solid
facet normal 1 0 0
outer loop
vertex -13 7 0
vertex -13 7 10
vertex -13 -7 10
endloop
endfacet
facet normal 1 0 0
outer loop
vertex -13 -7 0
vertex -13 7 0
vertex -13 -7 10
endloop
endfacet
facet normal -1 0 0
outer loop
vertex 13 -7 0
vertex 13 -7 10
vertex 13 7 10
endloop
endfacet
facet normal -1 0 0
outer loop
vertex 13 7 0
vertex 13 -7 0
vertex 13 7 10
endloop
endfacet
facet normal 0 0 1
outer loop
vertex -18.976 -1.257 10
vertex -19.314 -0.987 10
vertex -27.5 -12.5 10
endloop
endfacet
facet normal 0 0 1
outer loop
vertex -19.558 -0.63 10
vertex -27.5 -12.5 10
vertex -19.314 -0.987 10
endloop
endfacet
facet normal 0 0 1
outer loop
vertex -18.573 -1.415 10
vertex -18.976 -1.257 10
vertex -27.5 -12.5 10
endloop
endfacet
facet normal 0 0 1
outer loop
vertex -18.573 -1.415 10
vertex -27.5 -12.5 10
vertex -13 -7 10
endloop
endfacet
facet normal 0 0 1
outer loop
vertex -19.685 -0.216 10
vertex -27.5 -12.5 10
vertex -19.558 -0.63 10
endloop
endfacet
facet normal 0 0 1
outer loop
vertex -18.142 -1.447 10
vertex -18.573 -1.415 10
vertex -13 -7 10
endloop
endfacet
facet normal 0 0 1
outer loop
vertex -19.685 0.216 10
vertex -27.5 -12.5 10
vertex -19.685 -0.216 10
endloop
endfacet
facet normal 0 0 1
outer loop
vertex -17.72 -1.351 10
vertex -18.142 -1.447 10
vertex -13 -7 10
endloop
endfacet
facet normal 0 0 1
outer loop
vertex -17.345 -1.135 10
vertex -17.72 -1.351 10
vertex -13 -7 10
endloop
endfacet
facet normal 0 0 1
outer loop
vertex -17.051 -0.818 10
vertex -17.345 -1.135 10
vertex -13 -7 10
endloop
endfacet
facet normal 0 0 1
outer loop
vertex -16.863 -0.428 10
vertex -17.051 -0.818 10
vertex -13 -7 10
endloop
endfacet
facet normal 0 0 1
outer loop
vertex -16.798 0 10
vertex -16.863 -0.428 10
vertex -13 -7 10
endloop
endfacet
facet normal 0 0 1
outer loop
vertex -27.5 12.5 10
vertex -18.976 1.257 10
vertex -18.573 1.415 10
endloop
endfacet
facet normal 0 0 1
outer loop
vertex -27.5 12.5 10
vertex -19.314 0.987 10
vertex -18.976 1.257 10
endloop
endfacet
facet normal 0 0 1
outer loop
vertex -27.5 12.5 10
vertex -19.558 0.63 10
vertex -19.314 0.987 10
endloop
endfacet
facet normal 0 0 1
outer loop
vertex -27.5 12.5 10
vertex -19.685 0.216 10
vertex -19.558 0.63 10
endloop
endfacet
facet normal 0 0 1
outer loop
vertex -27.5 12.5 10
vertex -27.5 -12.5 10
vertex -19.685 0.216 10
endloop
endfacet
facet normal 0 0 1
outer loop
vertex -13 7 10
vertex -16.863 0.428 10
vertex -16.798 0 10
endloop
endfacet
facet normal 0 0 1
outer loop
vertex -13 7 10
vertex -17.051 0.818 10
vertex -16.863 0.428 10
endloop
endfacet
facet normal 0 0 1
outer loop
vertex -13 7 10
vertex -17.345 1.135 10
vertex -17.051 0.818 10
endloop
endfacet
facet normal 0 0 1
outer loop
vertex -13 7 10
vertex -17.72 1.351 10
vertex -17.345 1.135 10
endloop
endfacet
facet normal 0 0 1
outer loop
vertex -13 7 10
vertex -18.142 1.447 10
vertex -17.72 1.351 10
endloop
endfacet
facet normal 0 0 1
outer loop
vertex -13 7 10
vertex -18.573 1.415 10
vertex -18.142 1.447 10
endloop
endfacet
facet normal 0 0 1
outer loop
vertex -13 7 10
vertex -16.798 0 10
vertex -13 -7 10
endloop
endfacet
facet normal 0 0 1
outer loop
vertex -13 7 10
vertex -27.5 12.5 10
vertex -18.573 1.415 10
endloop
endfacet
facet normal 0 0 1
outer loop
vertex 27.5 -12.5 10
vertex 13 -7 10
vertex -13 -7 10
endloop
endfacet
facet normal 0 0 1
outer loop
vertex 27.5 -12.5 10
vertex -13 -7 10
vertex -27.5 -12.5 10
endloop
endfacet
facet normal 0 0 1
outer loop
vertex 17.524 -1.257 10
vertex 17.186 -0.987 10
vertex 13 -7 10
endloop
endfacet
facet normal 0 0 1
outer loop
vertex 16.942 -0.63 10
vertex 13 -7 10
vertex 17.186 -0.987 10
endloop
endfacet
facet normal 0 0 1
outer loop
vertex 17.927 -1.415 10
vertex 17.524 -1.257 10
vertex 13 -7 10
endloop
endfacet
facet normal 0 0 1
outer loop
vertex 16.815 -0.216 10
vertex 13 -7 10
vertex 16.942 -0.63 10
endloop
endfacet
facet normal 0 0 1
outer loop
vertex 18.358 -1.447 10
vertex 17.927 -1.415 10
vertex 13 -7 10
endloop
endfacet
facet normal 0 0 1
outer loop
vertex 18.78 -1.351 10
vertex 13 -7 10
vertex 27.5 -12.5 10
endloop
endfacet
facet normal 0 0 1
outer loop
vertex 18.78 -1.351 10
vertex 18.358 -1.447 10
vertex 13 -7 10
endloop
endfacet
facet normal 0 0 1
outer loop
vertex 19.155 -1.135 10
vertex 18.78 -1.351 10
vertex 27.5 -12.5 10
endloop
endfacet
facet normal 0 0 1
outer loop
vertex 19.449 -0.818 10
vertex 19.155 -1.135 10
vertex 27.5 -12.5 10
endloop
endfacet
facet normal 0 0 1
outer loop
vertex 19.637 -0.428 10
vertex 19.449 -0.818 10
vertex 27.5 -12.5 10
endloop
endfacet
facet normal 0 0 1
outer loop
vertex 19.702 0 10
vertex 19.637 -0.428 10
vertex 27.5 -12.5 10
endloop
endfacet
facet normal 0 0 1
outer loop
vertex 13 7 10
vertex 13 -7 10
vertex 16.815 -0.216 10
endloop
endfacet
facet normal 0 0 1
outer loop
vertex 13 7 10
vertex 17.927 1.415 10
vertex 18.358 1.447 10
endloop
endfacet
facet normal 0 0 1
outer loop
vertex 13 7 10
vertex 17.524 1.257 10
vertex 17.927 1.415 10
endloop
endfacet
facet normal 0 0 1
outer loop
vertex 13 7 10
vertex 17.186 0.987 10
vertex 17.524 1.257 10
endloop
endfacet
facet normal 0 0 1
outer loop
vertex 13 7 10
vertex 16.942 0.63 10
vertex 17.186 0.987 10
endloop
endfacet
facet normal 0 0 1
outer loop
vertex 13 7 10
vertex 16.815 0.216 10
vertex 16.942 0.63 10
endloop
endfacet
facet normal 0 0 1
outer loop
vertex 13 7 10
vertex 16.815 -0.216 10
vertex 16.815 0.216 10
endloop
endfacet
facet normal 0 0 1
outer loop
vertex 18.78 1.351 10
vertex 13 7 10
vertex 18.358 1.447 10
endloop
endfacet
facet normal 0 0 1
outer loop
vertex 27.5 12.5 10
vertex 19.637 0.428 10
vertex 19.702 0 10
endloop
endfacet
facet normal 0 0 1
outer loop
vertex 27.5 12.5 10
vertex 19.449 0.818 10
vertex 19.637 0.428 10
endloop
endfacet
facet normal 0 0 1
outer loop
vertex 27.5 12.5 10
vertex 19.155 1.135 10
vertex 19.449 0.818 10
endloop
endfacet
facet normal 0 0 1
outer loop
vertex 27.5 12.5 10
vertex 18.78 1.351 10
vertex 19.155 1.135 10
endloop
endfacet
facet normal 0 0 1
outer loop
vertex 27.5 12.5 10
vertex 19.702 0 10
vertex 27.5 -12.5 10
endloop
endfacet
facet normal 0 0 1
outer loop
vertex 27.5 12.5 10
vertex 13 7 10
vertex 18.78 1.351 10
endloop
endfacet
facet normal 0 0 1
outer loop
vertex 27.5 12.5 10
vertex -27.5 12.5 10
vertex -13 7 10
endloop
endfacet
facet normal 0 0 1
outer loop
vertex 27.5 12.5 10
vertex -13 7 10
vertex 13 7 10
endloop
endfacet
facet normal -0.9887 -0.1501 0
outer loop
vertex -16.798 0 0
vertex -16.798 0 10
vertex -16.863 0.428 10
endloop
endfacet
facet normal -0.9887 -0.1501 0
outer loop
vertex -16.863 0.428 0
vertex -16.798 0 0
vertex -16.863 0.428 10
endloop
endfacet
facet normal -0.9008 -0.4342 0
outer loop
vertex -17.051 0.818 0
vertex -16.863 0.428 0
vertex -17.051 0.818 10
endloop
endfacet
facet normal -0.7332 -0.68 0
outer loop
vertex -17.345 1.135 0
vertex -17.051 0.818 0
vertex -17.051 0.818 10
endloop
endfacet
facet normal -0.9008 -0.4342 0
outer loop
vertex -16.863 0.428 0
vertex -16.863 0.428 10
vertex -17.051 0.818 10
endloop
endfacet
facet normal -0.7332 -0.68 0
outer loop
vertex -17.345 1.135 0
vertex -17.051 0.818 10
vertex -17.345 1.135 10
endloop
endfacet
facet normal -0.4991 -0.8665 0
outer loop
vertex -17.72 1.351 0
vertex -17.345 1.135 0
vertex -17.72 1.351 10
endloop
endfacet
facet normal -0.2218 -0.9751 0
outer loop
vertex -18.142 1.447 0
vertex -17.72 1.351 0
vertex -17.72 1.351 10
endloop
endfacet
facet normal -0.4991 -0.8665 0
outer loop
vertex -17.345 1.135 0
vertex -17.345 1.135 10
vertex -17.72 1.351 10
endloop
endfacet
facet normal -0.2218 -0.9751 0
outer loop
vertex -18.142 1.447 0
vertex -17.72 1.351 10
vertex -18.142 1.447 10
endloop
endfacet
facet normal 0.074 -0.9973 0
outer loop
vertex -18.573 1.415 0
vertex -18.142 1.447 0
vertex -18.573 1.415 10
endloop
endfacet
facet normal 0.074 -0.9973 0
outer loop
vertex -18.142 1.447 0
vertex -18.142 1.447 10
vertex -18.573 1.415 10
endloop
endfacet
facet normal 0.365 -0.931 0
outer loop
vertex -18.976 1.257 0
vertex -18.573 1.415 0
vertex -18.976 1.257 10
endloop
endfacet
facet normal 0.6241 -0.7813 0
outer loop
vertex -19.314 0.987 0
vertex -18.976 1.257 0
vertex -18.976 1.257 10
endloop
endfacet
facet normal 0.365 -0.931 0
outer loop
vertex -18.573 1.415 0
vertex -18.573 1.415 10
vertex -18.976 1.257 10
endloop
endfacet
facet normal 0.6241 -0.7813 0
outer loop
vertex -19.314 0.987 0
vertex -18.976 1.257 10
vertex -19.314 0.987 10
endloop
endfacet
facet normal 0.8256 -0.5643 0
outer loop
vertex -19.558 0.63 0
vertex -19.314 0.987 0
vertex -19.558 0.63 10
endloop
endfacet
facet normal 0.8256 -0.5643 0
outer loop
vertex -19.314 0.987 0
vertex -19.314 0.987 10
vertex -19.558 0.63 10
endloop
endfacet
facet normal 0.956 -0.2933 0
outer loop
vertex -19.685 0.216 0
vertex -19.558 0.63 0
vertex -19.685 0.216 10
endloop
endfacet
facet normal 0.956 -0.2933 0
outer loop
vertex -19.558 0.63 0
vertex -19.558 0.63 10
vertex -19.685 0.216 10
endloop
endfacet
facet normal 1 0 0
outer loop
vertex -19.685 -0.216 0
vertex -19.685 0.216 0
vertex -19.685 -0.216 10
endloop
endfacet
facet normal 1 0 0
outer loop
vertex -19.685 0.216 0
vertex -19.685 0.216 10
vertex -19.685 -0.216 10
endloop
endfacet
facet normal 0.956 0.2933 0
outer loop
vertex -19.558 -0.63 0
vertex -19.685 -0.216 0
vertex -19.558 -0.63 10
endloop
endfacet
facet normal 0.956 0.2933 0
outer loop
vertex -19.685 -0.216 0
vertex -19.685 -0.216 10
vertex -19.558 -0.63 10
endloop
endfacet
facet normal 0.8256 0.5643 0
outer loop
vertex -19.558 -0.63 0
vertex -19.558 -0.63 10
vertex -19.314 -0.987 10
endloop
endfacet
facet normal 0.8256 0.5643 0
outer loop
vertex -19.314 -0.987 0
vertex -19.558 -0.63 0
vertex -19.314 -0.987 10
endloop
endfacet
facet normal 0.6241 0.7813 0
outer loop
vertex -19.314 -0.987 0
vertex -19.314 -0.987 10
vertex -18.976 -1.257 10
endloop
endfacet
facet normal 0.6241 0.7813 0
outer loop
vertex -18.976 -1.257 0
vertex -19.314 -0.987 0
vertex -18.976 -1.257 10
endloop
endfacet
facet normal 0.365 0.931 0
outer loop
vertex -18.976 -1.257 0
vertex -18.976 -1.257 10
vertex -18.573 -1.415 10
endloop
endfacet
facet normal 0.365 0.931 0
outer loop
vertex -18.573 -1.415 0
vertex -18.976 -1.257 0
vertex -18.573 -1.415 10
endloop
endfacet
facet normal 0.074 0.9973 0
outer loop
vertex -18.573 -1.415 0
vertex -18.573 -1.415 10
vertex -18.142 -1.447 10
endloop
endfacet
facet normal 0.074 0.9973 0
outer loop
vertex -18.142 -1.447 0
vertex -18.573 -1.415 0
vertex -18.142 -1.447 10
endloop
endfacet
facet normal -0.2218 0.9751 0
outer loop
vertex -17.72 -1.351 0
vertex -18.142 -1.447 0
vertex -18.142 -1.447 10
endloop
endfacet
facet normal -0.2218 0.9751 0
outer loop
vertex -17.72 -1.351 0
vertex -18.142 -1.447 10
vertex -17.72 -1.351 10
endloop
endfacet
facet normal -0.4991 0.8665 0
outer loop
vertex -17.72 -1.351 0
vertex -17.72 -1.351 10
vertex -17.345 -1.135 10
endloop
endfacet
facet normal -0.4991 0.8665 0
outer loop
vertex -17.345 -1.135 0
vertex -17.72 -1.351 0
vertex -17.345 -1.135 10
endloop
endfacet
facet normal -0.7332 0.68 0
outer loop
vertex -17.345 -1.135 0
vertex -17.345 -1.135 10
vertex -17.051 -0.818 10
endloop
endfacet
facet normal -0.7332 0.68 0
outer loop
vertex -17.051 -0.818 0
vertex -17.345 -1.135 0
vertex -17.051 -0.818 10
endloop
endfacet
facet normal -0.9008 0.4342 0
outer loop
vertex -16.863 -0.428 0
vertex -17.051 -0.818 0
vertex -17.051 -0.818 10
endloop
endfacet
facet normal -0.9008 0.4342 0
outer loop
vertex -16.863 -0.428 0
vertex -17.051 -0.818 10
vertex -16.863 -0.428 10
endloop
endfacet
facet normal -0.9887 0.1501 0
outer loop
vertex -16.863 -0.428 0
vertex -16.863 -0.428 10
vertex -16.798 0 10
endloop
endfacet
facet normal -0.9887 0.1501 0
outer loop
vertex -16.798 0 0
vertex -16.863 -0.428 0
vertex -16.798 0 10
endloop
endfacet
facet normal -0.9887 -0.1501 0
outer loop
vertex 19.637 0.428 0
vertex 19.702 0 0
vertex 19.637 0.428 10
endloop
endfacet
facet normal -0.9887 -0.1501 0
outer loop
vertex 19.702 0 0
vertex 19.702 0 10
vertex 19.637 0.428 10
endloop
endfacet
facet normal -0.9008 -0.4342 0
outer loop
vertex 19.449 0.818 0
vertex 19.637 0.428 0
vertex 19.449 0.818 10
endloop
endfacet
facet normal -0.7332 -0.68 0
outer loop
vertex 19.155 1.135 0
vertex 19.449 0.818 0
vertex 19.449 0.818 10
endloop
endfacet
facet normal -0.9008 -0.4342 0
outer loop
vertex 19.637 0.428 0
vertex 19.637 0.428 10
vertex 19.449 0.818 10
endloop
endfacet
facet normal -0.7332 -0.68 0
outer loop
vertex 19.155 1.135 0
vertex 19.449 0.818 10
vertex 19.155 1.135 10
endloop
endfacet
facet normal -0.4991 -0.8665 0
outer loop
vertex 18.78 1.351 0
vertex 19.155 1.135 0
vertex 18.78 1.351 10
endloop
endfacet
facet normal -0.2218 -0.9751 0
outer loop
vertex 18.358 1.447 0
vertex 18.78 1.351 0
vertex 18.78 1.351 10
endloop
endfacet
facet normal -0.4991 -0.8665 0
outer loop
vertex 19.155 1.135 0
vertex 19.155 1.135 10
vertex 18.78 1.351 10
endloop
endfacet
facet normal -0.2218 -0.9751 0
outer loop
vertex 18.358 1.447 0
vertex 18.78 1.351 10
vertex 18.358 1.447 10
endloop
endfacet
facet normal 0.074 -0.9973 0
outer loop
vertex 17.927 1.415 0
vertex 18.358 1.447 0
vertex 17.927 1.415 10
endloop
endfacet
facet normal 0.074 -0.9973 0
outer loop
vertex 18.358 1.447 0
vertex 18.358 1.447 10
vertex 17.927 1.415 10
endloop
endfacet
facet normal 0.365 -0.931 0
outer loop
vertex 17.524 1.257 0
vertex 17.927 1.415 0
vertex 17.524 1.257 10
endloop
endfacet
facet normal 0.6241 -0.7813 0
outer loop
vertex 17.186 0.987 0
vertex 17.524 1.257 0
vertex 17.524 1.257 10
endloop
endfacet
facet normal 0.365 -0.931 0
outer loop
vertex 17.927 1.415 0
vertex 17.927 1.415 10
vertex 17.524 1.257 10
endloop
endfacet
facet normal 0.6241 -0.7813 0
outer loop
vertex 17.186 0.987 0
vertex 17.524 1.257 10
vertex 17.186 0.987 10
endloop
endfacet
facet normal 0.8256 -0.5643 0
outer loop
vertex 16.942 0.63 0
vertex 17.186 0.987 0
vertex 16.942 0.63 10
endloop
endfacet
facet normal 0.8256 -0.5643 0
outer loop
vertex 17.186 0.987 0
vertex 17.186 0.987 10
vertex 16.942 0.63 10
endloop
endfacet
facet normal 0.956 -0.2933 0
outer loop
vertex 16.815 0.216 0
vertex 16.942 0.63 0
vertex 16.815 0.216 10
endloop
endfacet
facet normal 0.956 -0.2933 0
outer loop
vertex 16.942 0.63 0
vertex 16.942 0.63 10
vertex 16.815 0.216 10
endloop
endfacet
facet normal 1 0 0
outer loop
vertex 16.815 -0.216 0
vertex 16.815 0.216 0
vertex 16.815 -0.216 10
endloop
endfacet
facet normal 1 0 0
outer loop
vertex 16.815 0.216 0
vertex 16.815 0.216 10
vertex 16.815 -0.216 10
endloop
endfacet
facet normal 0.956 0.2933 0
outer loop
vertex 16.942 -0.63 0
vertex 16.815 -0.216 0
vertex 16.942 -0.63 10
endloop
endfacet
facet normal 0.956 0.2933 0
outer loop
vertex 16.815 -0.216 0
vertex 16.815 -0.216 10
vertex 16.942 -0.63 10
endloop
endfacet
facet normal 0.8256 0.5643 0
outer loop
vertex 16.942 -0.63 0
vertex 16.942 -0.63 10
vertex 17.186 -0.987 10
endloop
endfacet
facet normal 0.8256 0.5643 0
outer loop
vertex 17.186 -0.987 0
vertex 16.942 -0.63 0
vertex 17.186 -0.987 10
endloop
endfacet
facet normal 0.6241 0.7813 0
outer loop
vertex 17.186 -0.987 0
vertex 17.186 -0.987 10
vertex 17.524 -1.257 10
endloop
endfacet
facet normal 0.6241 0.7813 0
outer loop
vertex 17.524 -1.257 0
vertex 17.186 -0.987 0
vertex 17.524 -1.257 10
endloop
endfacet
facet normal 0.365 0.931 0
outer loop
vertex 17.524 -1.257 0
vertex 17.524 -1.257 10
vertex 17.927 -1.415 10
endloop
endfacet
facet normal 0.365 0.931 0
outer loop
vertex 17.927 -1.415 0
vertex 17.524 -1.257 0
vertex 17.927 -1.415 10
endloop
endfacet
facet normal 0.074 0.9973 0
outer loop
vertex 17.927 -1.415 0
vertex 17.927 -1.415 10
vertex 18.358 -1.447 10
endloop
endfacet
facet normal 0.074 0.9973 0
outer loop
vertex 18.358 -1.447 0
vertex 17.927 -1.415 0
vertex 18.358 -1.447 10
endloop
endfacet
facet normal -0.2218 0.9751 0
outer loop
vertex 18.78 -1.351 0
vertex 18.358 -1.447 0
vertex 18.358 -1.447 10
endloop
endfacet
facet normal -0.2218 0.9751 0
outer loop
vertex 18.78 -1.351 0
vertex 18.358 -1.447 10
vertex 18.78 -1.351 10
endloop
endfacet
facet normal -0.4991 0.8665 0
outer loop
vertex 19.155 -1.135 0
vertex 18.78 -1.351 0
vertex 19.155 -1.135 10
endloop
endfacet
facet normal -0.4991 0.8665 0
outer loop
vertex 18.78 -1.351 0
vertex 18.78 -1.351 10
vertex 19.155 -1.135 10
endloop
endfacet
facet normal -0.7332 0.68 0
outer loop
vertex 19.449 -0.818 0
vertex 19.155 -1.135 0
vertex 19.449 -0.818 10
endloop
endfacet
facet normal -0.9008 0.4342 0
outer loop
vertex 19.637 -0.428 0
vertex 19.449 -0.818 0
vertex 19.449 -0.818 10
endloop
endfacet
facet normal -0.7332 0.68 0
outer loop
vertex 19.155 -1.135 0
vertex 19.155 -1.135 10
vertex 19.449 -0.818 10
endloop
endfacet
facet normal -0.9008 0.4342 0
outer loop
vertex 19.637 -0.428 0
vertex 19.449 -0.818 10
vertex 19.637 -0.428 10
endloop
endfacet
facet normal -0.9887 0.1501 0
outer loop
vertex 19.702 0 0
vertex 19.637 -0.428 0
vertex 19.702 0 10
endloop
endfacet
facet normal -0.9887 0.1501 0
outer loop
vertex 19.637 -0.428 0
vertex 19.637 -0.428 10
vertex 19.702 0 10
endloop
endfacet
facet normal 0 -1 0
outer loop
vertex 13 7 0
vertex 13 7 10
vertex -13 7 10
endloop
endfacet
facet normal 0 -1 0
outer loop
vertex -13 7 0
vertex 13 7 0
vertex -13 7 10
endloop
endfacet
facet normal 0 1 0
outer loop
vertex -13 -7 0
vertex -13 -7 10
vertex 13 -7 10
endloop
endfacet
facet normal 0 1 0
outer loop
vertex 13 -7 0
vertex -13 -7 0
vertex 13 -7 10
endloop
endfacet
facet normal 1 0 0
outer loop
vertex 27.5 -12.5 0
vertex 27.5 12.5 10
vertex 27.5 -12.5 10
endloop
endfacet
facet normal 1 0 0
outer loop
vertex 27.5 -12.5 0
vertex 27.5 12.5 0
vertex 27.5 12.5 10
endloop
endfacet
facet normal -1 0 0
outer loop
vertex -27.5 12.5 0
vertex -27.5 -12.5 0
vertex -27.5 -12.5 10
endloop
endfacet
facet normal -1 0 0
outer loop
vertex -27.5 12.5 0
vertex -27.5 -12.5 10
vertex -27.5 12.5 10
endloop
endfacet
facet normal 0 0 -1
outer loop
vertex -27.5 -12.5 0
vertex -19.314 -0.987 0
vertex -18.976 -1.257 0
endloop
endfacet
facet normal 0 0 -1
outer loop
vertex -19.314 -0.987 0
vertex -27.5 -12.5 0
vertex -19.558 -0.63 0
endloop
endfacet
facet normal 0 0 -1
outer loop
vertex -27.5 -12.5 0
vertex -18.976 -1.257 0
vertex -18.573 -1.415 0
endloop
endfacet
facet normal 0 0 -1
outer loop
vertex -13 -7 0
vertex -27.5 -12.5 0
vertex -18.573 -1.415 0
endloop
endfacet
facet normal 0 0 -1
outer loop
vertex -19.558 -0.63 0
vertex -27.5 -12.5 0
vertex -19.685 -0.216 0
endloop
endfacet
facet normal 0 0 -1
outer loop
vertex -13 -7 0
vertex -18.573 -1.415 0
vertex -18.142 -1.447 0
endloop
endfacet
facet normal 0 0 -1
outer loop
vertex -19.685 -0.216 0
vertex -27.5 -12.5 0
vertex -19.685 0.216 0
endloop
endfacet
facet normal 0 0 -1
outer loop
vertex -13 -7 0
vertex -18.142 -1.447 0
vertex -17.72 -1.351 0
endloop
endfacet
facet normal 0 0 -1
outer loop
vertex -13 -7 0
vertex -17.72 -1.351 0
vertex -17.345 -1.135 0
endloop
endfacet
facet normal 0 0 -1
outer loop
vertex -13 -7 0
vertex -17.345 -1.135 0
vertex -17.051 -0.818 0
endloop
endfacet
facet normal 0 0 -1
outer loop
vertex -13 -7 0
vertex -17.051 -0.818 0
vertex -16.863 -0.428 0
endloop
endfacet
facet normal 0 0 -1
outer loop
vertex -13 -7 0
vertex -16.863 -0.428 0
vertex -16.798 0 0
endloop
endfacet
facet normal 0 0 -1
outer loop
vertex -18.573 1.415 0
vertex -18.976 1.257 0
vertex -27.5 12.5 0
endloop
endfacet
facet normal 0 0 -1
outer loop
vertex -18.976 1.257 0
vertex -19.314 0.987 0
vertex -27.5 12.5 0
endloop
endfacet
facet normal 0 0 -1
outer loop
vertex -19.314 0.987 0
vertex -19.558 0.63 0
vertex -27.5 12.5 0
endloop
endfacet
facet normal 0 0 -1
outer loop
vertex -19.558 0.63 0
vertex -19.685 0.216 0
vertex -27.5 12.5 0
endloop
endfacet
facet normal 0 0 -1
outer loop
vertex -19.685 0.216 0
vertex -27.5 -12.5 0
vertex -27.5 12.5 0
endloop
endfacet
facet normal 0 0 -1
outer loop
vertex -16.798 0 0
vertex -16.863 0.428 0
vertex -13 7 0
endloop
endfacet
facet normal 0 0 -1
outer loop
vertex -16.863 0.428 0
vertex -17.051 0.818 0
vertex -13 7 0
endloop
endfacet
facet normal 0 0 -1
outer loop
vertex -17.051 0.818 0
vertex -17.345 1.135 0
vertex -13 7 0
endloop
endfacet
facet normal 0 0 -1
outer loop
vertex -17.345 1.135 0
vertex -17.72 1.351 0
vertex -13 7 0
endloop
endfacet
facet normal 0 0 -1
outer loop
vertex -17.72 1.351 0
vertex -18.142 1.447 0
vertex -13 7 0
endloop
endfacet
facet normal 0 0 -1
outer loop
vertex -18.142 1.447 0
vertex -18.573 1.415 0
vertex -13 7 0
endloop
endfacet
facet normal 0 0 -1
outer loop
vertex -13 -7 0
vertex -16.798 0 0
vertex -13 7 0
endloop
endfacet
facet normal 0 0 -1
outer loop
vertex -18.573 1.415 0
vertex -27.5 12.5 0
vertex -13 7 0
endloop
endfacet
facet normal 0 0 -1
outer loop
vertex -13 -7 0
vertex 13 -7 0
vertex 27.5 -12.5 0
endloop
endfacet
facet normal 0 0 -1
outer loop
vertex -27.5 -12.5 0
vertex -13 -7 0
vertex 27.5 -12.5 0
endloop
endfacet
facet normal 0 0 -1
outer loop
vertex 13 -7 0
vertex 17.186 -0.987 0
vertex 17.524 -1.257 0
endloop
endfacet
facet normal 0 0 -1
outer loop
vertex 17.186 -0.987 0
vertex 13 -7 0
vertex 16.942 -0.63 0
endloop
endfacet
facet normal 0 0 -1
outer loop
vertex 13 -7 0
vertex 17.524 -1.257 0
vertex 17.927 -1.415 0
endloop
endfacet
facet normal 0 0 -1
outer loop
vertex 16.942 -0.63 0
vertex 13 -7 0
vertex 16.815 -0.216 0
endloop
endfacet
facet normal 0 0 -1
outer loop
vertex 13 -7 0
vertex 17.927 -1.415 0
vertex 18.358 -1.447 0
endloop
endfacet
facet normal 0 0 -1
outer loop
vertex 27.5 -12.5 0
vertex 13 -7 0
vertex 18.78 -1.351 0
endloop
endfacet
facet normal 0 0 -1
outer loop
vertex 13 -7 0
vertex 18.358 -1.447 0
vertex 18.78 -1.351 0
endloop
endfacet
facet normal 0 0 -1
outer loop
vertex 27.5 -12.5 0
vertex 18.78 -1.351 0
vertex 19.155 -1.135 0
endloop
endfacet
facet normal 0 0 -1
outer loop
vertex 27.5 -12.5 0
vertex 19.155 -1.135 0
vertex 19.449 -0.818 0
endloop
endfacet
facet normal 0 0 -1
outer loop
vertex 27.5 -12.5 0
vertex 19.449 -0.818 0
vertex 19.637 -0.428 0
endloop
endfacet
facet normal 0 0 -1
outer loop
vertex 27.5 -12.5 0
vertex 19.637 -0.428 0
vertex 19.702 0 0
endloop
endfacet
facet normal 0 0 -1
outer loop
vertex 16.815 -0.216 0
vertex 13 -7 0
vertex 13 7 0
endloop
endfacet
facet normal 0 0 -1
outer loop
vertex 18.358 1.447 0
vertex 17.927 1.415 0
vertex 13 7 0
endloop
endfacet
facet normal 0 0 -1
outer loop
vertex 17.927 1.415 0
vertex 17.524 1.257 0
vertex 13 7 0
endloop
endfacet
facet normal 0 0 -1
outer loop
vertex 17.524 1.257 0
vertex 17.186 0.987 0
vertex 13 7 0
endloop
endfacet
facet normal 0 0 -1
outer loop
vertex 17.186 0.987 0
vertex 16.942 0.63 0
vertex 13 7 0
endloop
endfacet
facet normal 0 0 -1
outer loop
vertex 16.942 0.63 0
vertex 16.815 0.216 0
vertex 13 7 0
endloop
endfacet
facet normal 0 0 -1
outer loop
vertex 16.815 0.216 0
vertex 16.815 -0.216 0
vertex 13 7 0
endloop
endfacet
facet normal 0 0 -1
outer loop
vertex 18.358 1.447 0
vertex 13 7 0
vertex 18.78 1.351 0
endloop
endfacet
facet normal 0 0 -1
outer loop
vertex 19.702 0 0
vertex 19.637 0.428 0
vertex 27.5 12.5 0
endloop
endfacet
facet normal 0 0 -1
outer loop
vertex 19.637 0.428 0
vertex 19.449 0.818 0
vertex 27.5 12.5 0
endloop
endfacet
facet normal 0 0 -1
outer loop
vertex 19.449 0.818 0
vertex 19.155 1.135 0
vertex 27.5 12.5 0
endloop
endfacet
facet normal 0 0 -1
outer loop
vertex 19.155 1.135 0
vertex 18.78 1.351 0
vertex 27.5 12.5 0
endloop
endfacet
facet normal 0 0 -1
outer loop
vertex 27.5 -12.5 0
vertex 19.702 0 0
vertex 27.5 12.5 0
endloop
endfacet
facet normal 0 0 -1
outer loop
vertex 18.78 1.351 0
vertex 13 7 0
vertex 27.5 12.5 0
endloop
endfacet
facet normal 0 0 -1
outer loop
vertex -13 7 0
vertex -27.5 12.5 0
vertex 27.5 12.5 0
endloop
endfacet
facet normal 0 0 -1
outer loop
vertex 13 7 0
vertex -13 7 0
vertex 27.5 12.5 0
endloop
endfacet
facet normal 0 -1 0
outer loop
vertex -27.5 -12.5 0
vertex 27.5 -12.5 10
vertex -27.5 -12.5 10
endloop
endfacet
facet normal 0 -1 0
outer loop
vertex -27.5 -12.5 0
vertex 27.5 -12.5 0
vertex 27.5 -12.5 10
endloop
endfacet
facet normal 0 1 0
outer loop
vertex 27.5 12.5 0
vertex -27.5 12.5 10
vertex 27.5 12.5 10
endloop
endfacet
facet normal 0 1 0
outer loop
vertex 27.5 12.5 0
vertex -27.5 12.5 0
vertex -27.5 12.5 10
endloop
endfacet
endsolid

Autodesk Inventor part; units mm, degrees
ref_plane "YZ Plane" through (0, 0, 0) normal (1, 0, 0) x (0, 1, 0)
ref_plane "XZ Plane" through (0, 0, 0) normal (0, 1, 0) x (-1, 0, 0)
ref_plane "XY Plane" through (0, 0, 0) normal (0, 0, 1) x (1, 0, 0)
sketch "Sketch1" plane through (0, 0, 0) normal (0, 0, 1) x (1, 0, 0)
  line L0 (-27.5, 12.5) -> (27.5, 12.5)
  line L1 (27.5, 12.5) -> (27.5, -12.5)
  line L2 (27.5, -12.5) -> (-27.5, -12.5)
  line L3 (-27.5, -12.5) -> (-27.5, 12.5)
  line L4 (-27.5, 12.5) -> (27.5, -12.5) construction
  line L5 (27.5, 12.5) -> (-27.5, -12.5) construction
  point P0 (0, 0)
  dimension "d0" = 55
  dimension "d1" = 25
extrude "Extrusion1" add sketch "Sketch1" along normal blind 10
sketch "Sketch2" plane through (0, 0, 10) normal (0, 0, 1) x (1, 0, 0)
  line L0 (-13, -7) -> (13, -7)
  line L1 (13, -7) -> (13, 7)
  line L2 (13, 7) -> (-13, 7)
  line L3 (-13, 7) -> (-13, -7)
  line L4 (-13, -7) -> (13, 7) construction
  line L5 (13, -7) -> (-13, 7) construction
  point P0 (0, 0)
  dimension "d4" = 26
  dimension "d5" = 14
extrude "Extrusion2" cut sketch "Sketch2" against normal through all
sketch "Sketch3" plane through (0, 0, 10) normal (0, 0, 1) x (1, 0, 0)
  point P0 (0, 0)
sketch "Sketch4" plane through (0, 0, 10) normal (0, 0, 1) x (1, 0, 0)
  circle A0 centre (-18.25, 0) radius 1.4515
  circle A1 centre (18.25, 0) radius 1.4515
  line L0 (-13, -7) -> (-13, 7) projected
  line L1 (13, 7) -> (13, -7) projected
  point P0 (0, 0)
  dimension "d8" = 2.903
  dimension "d9" = 2.903
  dimension "d10" = 5.25
  dimension "d11" = 5.25
extrude "Extrusion3" cut sketch "Sketch4" against normal through all
properties part number "2nd arm closing"
